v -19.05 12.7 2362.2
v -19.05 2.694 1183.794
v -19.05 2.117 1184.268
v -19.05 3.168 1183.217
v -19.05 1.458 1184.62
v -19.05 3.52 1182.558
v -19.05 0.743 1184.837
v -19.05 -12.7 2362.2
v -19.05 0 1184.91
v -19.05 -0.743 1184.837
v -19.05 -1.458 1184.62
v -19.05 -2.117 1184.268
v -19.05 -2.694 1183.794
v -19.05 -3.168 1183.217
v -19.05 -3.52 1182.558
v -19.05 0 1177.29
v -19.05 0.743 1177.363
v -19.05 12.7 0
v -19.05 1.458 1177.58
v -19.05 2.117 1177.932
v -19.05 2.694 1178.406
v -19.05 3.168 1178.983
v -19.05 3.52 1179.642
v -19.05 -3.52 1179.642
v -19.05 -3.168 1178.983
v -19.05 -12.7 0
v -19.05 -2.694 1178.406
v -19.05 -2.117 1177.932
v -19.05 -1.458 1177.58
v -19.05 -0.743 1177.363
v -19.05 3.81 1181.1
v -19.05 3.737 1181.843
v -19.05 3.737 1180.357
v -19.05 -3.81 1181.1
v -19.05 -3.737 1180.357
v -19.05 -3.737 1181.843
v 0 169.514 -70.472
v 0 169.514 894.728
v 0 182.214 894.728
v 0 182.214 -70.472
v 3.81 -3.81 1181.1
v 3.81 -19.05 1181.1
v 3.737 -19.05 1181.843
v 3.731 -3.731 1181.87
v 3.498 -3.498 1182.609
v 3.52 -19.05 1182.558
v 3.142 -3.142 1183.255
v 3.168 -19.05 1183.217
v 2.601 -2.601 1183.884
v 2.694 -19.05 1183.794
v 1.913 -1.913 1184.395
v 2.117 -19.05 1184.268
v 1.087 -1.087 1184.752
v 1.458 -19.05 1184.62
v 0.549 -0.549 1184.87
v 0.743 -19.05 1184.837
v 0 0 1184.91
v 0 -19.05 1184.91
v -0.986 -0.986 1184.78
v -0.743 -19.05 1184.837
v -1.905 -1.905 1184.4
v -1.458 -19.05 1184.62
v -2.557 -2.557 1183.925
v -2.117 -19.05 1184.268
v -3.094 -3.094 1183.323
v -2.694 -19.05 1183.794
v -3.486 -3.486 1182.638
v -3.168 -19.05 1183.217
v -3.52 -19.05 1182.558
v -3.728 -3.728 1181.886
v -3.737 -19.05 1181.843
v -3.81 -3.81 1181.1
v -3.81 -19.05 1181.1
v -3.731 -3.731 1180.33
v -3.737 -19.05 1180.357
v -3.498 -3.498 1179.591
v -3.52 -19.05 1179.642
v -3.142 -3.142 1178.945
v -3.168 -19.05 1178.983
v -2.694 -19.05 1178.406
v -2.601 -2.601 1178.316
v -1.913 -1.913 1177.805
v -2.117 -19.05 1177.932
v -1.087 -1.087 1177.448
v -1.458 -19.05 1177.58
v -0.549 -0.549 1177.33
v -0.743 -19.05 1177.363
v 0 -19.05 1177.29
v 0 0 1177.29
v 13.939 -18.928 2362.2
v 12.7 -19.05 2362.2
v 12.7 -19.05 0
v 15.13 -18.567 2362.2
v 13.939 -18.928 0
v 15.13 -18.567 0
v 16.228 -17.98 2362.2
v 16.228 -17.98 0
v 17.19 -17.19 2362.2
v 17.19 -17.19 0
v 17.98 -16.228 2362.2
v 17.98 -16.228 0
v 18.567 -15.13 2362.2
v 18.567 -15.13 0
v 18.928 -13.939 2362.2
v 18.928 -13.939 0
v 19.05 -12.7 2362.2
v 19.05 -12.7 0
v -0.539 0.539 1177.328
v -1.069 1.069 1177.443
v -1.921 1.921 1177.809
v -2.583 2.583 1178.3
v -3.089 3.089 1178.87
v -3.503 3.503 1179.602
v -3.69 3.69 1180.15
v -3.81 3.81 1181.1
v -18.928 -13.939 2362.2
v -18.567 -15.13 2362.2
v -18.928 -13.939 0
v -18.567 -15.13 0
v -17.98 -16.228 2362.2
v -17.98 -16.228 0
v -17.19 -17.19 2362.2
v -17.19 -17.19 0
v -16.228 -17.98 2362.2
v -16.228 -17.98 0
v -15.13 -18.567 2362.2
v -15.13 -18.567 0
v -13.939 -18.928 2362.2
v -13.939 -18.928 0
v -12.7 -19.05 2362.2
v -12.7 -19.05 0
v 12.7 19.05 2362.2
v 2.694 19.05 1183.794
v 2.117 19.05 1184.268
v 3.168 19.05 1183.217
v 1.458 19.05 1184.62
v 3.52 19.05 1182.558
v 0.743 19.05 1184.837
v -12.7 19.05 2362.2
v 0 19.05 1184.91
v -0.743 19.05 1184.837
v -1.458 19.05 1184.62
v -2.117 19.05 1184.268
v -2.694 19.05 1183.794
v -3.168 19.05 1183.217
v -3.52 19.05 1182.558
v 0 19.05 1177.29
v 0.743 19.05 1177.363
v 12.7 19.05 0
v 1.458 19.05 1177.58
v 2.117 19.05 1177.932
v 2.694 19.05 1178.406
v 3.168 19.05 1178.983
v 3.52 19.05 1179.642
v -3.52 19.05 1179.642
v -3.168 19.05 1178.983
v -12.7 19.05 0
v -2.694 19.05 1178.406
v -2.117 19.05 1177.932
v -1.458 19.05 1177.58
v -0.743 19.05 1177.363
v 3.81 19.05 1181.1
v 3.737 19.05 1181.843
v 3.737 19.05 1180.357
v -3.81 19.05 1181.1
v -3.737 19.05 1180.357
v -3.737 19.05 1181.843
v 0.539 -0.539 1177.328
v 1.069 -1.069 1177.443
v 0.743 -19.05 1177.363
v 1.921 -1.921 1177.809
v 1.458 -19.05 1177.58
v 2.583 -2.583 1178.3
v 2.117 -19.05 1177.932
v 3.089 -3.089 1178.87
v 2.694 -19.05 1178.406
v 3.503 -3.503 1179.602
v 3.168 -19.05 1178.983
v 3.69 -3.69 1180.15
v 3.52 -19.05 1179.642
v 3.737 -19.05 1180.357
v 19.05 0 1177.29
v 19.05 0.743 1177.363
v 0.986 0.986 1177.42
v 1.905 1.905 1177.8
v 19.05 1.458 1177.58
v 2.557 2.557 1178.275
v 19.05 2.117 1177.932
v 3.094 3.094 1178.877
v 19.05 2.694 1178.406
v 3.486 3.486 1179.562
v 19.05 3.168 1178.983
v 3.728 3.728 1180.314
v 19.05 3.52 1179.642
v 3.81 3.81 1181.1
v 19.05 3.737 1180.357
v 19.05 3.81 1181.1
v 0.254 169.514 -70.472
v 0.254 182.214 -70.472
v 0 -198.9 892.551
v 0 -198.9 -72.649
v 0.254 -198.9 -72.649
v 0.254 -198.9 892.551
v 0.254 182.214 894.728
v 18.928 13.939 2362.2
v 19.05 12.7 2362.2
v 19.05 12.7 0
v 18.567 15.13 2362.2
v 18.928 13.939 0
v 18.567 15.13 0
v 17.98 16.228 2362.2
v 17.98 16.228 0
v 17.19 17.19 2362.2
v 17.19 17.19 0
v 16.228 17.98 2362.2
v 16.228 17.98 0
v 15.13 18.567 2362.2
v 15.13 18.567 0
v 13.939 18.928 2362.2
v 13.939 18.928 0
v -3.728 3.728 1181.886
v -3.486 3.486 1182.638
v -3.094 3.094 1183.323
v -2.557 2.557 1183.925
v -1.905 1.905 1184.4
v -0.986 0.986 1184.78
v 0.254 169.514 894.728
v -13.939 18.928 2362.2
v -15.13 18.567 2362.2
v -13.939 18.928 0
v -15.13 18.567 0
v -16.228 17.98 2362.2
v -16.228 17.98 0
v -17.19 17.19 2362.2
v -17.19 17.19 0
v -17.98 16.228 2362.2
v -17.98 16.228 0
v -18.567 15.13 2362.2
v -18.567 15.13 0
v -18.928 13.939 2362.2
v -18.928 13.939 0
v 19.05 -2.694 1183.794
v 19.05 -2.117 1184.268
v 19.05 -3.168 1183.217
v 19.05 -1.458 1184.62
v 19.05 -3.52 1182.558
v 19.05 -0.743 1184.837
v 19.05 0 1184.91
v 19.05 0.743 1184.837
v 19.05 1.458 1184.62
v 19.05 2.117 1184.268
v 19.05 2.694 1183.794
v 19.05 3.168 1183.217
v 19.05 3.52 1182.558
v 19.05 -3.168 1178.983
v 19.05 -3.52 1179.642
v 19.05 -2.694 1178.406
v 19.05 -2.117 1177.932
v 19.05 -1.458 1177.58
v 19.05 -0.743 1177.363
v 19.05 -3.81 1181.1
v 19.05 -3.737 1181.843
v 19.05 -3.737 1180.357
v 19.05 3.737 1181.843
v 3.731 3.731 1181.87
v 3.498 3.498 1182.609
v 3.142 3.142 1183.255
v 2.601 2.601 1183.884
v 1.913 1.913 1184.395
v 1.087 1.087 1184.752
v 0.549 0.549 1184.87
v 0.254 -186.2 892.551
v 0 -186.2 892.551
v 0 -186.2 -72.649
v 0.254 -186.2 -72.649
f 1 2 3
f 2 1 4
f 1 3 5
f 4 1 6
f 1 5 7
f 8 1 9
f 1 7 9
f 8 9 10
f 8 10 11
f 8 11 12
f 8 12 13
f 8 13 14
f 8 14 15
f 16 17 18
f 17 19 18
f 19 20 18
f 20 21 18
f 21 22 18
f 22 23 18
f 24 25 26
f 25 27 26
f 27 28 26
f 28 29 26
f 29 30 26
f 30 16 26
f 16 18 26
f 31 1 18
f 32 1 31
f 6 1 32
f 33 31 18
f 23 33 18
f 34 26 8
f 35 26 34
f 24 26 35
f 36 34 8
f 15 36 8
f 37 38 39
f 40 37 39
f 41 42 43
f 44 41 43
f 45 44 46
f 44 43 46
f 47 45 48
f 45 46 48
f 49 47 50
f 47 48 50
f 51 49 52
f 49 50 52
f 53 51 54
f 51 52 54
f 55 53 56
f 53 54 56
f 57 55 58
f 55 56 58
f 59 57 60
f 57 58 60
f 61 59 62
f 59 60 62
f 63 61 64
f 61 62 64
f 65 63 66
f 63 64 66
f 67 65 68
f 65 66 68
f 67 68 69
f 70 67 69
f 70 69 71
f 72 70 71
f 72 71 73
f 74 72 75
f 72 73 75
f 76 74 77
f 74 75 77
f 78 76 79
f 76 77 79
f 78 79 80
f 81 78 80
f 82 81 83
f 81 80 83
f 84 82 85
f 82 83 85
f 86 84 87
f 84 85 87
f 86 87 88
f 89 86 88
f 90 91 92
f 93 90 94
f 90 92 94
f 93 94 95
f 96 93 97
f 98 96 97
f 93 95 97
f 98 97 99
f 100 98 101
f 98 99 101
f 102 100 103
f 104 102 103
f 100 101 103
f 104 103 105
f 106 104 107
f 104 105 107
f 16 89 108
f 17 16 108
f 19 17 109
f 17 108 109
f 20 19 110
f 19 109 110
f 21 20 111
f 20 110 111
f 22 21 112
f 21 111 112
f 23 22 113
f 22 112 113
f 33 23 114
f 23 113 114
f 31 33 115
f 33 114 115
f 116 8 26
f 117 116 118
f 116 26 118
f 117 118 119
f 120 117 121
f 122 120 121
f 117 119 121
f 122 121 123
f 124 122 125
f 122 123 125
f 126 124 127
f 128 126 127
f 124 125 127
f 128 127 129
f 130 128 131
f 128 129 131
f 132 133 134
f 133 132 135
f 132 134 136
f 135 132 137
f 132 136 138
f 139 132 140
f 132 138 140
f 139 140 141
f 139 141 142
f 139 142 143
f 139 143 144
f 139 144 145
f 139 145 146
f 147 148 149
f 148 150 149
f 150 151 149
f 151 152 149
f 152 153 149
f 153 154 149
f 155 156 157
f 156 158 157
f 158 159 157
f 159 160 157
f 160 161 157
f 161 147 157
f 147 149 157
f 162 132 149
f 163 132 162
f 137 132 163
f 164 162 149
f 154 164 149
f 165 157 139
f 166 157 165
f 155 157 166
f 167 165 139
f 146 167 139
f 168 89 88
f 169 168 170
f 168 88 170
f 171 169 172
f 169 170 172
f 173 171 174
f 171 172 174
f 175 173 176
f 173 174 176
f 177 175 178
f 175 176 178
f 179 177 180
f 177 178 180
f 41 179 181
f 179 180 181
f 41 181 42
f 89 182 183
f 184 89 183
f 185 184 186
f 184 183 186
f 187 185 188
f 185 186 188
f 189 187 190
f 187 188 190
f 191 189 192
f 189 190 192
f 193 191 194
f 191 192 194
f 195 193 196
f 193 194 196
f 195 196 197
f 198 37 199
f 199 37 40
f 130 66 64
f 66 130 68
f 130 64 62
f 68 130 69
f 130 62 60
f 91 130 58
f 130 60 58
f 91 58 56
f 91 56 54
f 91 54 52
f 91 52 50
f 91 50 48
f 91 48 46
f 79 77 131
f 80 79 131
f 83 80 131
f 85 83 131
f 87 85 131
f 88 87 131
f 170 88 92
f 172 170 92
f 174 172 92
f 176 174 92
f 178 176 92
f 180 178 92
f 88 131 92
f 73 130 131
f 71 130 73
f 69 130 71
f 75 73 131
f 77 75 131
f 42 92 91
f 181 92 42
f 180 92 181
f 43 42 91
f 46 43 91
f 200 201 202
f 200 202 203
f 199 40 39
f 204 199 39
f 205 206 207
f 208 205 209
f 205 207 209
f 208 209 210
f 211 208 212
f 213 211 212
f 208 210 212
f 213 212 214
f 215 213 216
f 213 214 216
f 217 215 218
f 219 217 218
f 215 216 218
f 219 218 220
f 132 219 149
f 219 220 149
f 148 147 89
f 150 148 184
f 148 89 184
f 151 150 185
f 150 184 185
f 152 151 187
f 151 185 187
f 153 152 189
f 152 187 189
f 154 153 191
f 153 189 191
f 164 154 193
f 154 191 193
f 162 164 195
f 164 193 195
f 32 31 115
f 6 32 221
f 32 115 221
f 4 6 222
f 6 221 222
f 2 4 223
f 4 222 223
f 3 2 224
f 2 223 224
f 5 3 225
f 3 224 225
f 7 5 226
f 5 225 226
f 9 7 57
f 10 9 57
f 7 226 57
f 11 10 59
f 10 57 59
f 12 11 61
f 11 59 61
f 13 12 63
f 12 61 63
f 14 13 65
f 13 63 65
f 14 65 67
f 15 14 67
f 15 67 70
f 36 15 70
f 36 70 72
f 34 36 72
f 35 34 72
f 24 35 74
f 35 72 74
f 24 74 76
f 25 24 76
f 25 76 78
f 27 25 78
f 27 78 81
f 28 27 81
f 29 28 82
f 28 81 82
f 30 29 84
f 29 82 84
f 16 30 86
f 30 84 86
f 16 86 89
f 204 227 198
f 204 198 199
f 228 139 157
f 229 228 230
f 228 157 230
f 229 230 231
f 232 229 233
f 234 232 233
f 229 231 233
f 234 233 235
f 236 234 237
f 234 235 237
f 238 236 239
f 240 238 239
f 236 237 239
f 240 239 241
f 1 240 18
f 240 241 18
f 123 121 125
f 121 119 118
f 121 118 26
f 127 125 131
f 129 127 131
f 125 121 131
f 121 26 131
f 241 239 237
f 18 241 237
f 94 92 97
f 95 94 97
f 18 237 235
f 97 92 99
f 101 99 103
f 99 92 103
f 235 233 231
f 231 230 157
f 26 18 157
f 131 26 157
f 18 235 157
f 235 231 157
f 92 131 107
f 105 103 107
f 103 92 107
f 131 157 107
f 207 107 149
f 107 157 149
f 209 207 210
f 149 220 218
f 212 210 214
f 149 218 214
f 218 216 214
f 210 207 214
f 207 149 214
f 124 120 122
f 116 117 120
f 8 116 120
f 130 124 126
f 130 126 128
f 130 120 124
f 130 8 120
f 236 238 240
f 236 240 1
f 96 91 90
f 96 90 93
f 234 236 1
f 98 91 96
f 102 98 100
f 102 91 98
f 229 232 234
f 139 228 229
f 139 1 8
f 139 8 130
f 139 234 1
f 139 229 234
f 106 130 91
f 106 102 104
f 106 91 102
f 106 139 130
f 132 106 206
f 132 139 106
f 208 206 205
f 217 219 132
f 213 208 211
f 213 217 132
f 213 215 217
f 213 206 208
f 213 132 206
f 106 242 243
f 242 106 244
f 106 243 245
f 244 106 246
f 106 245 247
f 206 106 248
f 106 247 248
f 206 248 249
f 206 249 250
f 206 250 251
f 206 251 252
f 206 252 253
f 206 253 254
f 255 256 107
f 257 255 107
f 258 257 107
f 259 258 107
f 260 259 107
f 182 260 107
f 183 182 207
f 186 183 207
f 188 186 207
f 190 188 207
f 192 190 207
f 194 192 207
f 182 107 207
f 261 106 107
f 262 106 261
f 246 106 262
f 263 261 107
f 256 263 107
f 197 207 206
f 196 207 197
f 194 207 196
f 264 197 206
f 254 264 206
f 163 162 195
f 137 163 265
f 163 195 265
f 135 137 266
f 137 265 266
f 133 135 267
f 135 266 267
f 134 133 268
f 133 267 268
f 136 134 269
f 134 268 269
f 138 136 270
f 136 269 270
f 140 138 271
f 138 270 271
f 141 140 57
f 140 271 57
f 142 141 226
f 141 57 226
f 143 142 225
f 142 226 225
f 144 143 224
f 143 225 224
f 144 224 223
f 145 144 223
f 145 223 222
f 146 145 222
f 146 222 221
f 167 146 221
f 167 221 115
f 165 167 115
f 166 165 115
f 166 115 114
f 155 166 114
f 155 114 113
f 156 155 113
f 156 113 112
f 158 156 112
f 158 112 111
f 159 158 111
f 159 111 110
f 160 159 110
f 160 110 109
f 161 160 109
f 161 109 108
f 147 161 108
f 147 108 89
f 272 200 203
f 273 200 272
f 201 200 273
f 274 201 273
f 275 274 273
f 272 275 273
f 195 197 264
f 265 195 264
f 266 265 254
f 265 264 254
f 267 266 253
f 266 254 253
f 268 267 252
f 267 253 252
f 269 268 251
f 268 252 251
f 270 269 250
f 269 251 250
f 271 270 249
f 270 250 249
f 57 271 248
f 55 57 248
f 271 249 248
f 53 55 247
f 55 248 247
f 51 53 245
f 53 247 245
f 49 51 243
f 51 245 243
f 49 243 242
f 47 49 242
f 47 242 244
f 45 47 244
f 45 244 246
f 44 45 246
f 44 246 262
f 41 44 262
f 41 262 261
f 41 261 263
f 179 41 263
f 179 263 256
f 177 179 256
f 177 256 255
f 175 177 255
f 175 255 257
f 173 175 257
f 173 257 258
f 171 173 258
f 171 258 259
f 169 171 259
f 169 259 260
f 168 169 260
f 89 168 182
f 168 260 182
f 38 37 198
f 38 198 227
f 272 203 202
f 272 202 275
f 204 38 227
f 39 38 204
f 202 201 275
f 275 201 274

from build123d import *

# Parameters (mm, degrees)
F1_DEPTH = 2362.2
F2_W     = 12.7
F2_H     = 965.2
F4_DEPTH = 0.254
F3_W     = 12.7
F3_H     = 965.2
F5_DEPTH = 0.254
F7_DEPTH = 38.1
F9_DEPTH = 38.1


with BuildPart() as f1:
    # F0 (on Top) → F1 (new body)
    with BuildSketch(Plane.XY):
        with BuildLine():
            ThreePointArc((19.05, 12.7), (17.190128, 17.190128), (12.7, 19.05))
            Line((12.7, 19.05), (-12.7, 19.05))
            ThreePointArc((-12.7, 19.05), (-17.190128, 17.190128), (-19.05, 12.7))
            Line((-19.05, 12.7), (-19.05, -12.7))
            ThreePointArc((-19.05, -12.7), (-17.190128, -17.190128), (-12.7, -19.05))
            Line((-12.7, -19.05), (12.7, -19.05))
            ThreePointArc((12.7, -19.05), (17.190128, -17.190128), (19.05, -12.7))
            Line((19.05, -12.7), (19.05, 12.7))
        make_face()
    extrude(amount=F1_DEPTH)

    # F6 (on face) → F7 (cut)
    with BuildSketch(Plane.XZ.offset(19.05)):
        with BuildLine():
            ThreePointArc((0, 1177.29), (2.694077, 1178.405923), (3.81, 1181.1))
            ThreePointArc((3.81, 1181.1), (-2.694077, 1183.794077), (0, 1177.29))
        make_face()
    extrude(amount=-F7_DEPTH, mode=Mode.SUBTRACT)

    # F8 (on face) → F9 (cut)
    with BuildSketch(Plane.YZ.offset(19.05)):
        with BuildLine():
            ThreePointArc((0, 1177.29), (2.694077, 1178.405923), (3.81, 1181.1))
            ThreePointArc((3.81, 1181.1), (-2.694077, 1183.794077), (0, 1177.29))
        make_face()
    extrude(amount=-F9_DEPTH, mode=Mode.SUBTRACT)


with BuildPart() as f4:
    # F2 (on Right) → F4 (new body)
    with BuildSketch(Plane.YZ):
        with Locations((-192.550282, 409.951065)):
            Rectangle(F2_W, F2_H)
    extrude(amount=F4_DEPTH)


with BuildPart() as f5:
    # F3 (on Right) → F5 (new body)
    with BuildSketch(Plane.YZ):
        with Locations((175.864179, 412.127815)):
            Rectangle(F3_W, F3_H)
    extrude(amount=F5_DEPTH)


solid = Compound([f1.part, f4.part, f5.part])
